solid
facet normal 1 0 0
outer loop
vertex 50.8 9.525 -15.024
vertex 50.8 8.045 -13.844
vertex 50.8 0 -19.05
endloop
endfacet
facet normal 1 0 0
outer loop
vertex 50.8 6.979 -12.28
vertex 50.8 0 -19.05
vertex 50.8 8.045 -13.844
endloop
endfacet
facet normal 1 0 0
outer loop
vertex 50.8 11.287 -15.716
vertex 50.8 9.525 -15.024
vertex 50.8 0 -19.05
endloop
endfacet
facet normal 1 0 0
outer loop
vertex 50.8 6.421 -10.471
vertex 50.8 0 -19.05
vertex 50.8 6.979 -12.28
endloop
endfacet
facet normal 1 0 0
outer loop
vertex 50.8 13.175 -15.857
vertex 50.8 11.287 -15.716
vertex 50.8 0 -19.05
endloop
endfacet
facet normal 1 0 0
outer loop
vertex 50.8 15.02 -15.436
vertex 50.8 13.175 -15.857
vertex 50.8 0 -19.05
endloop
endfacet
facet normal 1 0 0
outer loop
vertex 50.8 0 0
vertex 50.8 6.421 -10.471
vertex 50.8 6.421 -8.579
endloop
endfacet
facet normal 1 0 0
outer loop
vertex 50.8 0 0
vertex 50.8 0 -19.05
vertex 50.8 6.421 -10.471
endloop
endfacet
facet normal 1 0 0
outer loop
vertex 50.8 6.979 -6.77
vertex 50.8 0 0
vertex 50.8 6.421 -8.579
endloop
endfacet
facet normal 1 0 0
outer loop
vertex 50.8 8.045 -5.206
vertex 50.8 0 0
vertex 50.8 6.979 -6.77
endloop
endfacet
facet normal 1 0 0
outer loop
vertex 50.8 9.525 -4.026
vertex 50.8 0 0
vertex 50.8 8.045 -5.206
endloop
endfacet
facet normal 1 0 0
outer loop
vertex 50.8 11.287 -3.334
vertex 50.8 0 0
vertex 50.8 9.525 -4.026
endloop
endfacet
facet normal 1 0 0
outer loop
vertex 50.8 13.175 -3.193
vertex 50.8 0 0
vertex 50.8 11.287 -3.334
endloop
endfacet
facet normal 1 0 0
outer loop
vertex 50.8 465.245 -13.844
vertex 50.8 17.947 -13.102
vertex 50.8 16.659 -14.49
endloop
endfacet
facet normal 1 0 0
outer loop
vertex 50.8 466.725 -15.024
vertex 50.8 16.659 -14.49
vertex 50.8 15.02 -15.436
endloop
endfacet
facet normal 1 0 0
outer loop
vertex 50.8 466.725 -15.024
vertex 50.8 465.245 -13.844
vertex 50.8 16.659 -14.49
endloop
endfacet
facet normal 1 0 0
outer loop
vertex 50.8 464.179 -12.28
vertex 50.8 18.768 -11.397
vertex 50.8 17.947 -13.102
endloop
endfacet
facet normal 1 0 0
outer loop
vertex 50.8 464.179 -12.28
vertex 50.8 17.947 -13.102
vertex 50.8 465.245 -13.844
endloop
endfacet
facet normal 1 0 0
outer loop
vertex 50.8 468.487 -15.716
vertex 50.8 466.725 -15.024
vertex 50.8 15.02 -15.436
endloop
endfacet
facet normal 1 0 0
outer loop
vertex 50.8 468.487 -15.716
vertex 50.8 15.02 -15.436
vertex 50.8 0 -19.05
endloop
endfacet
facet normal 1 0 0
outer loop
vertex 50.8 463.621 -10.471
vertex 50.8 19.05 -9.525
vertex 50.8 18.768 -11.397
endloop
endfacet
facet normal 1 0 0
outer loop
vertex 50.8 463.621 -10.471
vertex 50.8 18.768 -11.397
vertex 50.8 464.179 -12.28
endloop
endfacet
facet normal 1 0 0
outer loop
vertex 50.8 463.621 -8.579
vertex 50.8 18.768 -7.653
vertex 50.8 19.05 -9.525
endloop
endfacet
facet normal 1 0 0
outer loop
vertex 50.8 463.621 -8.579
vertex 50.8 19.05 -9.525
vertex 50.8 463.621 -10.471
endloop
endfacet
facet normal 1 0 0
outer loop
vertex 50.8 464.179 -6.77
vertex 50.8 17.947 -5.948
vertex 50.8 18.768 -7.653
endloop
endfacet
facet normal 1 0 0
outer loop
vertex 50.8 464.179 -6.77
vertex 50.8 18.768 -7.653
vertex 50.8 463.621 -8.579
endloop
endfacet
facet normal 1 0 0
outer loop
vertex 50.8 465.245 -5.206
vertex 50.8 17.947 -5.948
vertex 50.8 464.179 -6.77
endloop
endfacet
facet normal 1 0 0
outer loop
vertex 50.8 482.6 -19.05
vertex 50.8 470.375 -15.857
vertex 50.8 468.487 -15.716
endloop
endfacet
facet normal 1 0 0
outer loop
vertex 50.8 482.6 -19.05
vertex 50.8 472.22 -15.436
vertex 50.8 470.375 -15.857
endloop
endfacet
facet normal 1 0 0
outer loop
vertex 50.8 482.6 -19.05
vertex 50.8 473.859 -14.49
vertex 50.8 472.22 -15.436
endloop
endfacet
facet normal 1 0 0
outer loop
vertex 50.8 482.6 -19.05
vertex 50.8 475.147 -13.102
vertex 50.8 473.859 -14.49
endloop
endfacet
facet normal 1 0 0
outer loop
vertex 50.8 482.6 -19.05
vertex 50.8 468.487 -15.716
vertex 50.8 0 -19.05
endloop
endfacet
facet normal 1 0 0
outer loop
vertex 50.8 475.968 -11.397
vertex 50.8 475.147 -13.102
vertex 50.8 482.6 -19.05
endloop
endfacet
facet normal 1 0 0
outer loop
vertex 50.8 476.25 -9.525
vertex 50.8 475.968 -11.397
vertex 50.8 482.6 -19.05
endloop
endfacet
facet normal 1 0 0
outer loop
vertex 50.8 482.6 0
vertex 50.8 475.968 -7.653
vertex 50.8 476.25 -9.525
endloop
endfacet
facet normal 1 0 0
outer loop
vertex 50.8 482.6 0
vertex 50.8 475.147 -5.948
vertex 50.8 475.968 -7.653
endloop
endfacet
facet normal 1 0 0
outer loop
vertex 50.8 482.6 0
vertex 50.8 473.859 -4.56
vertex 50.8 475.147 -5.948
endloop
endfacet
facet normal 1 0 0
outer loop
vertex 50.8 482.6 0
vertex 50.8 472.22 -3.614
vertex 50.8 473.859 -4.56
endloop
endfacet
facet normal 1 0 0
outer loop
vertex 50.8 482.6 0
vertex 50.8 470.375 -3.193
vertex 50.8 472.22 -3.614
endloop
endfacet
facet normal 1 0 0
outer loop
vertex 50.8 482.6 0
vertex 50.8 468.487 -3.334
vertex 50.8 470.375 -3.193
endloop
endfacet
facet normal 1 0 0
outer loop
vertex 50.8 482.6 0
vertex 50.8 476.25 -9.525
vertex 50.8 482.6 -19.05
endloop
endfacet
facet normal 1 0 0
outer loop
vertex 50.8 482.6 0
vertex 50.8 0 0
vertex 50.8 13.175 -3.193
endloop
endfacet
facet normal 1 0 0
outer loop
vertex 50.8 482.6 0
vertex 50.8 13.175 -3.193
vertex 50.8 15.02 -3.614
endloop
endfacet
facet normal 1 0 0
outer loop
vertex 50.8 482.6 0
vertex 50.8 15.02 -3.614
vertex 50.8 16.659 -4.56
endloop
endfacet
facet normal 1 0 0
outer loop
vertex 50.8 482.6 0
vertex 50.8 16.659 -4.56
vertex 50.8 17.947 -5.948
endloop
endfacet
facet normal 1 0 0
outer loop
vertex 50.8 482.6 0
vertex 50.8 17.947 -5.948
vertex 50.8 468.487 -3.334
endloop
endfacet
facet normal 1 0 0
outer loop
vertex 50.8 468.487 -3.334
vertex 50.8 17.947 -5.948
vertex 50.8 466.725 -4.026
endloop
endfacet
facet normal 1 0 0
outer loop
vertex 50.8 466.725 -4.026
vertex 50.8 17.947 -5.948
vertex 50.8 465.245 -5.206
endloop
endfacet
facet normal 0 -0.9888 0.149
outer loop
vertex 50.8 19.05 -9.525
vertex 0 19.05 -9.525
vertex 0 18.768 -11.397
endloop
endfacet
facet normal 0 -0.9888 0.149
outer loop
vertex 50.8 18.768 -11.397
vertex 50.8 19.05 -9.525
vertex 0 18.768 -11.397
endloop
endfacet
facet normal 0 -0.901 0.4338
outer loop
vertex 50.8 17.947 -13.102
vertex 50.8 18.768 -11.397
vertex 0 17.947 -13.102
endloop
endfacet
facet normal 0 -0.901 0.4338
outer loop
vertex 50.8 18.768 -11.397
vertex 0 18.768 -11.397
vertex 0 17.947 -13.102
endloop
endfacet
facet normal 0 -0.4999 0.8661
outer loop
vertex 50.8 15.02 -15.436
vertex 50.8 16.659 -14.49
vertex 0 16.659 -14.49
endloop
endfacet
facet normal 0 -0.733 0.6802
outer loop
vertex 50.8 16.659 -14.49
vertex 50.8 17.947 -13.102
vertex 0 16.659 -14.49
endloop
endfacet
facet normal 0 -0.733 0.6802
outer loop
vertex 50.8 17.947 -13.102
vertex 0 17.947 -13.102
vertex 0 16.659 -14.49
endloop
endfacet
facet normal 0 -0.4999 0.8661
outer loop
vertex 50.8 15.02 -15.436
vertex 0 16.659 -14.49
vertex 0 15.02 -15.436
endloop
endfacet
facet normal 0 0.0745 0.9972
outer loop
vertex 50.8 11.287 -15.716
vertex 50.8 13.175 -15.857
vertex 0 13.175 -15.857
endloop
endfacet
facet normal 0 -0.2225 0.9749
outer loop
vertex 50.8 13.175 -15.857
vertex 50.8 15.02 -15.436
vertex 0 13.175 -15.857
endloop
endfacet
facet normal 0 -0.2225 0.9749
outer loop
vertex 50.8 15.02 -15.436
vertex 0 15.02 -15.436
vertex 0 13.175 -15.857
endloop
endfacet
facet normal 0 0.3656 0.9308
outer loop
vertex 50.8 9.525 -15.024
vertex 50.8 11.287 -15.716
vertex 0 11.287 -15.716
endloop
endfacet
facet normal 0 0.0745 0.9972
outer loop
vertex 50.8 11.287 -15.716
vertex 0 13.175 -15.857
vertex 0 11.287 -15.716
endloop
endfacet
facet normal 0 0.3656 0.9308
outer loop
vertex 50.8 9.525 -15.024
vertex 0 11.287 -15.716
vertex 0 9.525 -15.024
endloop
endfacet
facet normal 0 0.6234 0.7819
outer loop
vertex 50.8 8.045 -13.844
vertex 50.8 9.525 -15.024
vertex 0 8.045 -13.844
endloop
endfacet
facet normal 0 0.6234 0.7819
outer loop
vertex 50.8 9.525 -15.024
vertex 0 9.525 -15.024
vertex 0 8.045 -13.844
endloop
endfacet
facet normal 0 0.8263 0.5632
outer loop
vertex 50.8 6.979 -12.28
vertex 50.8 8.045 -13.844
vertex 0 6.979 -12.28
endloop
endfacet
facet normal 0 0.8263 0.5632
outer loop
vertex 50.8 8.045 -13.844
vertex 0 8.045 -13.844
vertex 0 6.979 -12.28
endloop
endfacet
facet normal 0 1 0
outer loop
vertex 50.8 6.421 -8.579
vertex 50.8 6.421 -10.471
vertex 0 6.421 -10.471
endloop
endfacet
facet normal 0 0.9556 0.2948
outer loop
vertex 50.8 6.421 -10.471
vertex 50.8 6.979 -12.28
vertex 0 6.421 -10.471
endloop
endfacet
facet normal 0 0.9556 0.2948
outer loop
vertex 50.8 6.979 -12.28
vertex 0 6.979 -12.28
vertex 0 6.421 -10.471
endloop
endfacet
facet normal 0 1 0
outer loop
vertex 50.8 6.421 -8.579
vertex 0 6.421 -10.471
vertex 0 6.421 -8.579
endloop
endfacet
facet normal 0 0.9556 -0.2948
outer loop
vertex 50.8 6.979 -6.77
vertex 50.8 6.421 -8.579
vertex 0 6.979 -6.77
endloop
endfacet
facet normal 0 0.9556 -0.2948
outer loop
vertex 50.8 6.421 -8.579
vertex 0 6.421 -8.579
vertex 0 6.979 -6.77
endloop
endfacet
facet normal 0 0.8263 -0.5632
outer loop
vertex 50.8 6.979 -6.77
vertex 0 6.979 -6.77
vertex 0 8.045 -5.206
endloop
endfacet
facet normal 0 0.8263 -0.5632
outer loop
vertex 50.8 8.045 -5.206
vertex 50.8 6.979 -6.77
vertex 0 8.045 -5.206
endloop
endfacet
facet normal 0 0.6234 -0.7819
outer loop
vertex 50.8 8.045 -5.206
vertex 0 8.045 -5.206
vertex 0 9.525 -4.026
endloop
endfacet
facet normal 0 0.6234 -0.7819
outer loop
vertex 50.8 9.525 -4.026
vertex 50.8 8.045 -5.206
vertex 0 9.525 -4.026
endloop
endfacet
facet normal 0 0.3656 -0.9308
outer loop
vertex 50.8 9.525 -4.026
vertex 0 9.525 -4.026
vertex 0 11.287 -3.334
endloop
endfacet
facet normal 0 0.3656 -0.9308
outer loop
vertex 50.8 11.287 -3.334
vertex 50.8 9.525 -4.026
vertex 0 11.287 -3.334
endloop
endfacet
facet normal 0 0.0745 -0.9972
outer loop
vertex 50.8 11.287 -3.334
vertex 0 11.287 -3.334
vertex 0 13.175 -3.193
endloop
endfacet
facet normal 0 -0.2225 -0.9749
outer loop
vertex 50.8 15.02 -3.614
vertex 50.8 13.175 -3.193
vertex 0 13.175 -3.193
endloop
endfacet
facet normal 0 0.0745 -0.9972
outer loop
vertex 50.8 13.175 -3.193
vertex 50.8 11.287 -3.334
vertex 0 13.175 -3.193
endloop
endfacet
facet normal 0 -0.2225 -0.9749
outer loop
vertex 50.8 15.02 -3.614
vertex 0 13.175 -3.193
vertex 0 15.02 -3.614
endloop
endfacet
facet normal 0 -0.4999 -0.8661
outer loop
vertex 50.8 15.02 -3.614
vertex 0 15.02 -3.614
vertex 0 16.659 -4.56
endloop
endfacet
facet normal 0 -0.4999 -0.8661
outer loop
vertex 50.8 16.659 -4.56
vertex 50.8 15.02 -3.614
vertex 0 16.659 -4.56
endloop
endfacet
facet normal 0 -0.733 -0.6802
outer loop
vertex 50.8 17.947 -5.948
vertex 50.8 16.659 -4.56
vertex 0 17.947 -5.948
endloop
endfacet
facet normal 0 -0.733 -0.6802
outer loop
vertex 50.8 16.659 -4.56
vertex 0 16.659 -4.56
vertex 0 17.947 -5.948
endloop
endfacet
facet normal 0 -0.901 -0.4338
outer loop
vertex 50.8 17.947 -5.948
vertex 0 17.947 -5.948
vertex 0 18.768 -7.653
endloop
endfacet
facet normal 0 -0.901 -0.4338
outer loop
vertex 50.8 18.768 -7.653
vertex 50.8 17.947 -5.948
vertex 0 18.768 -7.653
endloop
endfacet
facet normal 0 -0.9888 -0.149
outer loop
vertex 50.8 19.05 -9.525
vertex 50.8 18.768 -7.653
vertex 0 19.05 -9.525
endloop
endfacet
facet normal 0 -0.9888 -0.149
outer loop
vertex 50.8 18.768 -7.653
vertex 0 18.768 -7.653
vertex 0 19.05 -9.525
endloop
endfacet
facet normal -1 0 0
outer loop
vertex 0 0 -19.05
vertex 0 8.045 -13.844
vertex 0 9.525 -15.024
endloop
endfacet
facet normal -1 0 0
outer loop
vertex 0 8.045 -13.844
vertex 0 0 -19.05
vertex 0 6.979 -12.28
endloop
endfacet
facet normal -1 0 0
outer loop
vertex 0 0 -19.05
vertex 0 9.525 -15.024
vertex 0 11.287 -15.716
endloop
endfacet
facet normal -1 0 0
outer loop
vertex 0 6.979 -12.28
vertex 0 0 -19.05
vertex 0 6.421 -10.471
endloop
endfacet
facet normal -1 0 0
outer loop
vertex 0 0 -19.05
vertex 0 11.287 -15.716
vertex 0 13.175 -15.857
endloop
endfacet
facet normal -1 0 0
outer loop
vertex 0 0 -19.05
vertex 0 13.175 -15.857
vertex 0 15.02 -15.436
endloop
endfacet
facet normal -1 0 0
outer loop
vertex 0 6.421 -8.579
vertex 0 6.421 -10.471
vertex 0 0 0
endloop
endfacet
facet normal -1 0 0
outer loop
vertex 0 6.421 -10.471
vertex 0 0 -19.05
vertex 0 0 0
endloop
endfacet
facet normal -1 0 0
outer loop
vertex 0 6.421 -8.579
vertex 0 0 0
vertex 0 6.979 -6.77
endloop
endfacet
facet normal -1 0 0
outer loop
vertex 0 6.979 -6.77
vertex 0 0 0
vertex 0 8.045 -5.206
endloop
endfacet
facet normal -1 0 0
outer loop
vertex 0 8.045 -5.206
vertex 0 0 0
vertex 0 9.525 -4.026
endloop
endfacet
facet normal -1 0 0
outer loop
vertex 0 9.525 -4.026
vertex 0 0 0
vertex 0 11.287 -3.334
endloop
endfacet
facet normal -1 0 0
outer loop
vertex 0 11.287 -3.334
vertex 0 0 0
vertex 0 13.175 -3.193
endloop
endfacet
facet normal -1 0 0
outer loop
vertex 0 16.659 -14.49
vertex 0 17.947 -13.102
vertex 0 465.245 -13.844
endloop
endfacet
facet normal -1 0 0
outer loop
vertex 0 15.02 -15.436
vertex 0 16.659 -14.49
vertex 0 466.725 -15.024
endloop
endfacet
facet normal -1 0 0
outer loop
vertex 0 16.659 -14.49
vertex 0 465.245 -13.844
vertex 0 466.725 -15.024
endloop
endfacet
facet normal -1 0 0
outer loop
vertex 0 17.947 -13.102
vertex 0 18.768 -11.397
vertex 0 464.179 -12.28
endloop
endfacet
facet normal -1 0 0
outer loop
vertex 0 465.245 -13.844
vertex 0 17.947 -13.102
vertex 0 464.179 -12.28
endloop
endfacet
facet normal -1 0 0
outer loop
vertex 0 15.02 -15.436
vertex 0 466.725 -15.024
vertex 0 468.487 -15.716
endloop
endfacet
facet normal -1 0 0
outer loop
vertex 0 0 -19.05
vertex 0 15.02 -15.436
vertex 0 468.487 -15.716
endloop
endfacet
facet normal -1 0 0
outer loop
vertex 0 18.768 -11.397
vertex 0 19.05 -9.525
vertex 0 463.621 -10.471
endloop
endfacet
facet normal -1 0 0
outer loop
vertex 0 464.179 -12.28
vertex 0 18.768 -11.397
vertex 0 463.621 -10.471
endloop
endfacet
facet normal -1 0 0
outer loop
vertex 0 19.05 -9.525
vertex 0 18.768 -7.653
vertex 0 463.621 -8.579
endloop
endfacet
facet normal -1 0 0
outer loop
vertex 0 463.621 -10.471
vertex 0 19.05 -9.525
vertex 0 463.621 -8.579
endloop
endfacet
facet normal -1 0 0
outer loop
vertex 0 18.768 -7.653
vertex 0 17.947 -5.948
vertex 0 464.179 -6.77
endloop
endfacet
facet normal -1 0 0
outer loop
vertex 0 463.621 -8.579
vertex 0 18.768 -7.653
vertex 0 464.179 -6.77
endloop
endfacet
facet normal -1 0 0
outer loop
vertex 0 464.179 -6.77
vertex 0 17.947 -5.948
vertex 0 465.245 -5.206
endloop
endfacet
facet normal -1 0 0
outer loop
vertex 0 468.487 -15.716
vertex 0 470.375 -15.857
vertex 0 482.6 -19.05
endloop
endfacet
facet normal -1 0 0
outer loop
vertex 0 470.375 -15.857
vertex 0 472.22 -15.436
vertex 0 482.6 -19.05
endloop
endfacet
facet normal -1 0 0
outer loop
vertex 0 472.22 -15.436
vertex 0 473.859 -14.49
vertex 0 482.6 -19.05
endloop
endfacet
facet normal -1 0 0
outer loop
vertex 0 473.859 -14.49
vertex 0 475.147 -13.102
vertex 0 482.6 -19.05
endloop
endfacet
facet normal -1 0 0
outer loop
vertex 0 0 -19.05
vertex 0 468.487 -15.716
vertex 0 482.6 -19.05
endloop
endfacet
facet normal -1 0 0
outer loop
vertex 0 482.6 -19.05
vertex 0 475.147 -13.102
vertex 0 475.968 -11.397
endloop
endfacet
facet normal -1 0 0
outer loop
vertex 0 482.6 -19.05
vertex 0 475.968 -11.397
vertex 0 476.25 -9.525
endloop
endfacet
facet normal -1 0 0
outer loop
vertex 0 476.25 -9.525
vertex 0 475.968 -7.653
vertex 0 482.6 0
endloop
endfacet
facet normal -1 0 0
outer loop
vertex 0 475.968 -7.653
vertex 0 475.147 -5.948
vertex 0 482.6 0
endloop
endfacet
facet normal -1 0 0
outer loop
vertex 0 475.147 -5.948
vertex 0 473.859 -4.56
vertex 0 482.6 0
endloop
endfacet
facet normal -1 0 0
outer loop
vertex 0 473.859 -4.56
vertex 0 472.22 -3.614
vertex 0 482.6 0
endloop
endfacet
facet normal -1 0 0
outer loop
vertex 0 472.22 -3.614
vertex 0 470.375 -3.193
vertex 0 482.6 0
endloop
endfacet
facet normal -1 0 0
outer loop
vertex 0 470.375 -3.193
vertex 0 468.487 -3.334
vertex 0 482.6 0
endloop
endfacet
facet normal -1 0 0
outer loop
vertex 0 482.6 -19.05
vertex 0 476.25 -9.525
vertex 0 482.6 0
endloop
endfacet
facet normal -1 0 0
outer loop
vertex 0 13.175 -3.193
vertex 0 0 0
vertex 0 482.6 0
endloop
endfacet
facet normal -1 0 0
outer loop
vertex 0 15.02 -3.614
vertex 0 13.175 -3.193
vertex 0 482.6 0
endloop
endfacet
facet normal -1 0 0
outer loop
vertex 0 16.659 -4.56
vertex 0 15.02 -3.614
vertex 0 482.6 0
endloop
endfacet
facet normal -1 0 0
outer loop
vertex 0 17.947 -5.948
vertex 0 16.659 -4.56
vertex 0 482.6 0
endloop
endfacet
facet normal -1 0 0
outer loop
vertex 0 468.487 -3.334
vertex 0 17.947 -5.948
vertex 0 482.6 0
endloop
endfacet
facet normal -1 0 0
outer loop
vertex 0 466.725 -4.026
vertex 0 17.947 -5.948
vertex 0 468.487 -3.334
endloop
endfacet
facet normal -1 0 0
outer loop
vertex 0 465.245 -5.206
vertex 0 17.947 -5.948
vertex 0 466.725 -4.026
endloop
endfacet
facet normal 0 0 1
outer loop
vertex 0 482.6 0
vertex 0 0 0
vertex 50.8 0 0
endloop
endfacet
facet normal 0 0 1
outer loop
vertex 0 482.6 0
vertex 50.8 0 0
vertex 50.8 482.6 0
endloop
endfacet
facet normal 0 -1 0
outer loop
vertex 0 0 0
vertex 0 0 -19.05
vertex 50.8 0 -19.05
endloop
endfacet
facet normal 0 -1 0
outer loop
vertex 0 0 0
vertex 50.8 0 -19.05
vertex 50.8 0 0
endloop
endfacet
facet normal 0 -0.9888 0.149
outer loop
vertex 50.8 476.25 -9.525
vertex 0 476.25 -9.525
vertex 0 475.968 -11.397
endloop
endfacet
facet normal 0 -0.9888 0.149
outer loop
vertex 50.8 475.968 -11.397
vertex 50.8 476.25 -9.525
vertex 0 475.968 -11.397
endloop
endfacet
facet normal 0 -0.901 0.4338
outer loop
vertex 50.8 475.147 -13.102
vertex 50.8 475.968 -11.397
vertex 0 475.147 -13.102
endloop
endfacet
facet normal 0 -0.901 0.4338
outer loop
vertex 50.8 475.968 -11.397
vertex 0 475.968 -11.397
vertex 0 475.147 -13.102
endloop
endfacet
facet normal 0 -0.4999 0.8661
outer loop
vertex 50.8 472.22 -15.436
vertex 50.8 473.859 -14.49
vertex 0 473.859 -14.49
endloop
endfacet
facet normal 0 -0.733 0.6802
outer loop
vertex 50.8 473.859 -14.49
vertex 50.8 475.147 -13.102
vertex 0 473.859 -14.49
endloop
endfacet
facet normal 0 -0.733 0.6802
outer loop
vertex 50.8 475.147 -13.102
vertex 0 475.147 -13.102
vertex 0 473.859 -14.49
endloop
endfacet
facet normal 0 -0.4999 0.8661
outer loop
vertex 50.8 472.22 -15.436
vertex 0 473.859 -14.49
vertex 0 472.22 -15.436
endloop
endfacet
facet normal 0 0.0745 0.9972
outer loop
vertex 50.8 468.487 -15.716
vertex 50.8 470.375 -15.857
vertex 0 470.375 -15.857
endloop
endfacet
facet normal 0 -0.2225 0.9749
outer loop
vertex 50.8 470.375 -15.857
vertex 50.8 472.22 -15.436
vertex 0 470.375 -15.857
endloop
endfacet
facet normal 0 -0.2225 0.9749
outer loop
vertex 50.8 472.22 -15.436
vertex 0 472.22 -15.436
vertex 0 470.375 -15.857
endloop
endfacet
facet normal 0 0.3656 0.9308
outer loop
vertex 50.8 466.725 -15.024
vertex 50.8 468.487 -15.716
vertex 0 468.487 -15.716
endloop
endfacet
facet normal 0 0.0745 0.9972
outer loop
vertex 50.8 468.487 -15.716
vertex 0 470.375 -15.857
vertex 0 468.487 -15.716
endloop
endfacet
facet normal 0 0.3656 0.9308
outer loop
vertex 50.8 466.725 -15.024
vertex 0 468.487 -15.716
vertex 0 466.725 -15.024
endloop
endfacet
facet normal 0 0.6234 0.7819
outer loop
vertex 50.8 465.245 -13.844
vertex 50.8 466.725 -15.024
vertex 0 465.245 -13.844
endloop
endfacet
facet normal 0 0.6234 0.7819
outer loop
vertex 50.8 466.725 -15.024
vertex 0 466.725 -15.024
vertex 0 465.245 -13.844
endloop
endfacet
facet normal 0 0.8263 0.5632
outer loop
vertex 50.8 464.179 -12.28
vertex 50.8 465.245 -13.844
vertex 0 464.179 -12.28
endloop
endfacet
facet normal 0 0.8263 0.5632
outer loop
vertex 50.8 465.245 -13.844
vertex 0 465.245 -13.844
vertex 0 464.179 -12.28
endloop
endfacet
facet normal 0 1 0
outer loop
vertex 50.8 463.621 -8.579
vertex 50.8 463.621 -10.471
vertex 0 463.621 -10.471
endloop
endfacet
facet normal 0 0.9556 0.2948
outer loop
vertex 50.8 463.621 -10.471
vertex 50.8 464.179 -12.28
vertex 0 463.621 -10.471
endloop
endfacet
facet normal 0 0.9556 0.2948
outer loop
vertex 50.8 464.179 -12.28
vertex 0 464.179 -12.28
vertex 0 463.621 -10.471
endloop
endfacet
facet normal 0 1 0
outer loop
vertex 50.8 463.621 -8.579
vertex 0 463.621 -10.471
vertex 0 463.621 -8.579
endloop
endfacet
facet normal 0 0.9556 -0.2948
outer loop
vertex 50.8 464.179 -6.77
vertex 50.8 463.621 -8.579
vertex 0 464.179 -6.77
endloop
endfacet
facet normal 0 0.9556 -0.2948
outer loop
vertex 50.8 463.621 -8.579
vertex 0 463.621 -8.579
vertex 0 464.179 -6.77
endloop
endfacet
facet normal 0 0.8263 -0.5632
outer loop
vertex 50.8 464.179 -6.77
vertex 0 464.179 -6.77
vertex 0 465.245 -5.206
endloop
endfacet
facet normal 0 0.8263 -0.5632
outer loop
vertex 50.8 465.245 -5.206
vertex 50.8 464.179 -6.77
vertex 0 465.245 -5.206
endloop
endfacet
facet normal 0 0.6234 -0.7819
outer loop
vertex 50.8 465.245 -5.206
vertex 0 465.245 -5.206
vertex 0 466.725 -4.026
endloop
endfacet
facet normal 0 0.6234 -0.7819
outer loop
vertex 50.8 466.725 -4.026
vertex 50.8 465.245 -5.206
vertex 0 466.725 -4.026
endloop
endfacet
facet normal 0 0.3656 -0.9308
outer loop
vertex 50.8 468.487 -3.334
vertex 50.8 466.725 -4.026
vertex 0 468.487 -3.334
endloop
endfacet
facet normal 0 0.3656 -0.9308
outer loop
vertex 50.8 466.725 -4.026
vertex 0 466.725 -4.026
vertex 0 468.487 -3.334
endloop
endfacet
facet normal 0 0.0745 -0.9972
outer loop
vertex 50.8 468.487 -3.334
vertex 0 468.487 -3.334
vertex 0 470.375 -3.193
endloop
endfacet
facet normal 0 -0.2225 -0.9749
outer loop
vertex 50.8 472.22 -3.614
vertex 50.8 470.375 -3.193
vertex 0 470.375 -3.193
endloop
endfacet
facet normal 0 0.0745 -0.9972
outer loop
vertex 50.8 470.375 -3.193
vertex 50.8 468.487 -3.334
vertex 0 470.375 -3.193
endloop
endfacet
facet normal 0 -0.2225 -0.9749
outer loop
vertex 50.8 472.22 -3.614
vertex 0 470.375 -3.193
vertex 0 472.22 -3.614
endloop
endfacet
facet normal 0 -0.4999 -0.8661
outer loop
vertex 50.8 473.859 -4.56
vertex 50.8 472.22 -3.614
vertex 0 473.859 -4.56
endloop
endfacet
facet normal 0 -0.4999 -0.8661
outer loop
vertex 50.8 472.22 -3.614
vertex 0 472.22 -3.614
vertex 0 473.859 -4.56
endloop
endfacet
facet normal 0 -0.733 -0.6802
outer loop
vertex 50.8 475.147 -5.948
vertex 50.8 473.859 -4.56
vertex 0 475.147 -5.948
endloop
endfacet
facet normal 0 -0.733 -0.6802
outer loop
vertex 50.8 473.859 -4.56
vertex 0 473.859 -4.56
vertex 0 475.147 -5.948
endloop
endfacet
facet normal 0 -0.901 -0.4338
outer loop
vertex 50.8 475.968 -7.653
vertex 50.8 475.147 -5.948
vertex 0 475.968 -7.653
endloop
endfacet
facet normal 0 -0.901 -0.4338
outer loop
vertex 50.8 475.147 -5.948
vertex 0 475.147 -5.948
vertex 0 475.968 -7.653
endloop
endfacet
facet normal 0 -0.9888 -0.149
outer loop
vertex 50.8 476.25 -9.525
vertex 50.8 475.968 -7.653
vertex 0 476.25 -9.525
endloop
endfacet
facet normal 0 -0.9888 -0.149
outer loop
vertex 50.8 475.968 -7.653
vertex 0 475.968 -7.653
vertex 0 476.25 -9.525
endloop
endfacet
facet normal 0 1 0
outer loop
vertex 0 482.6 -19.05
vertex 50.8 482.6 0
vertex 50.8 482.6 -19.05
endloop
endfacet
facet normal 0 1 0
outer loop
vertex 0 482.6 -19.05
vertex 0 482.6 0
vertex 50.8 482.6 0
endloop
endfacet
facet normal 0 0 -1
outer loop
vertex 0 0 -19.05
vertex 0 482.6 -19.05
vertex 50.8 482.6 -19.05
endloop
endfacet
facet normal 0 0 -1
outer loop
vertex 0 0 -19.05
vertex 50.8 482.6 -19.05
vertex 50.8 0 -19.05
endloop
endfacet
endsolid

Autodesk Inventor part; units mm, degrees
ref_plane "YZ Plane" through (0, 0, 0) normal (1, 0, 0) x (0, 1, 0)
ref_plane "XZ Plane" through (0, 0, 0) normal (0, 1, 0) x (-1, 0, 0)
ref_plane "XY Plane" through (0, 0, 0) normal (0, 0, 1) x (1, 0, 0)
sketch "Sketch1" plane through (0, 0, 0) normal (1, 0, 0) x (0, 1, 0)
  line L0 (0, 0) -> (482.6, 0)
  line L1 (482.6, 0) -> (482.6, -19.05)
  line L2 (482.6, -19.05) -> (0, -19.05)
  line L3 (0, -19.05) -> (0, 0)
  circle A0 centre (469.9, -9.525) radius 6.35
  circle A1 centre (12.7, -9.525) radius 6.35
  dimension "d0" = 482.6
  dimension "d1" = 19.05
  dimension "d2" = 12.7
  dimension "d3" = 12.7
  dimension "d4" = 12.7
  dimension "d5" = 12.7
extrude "Extrusion1" add sketch "Sketch1" along normal blind 50.8
equation "\"d5\" = d4"
properties part number "ArmProto"
